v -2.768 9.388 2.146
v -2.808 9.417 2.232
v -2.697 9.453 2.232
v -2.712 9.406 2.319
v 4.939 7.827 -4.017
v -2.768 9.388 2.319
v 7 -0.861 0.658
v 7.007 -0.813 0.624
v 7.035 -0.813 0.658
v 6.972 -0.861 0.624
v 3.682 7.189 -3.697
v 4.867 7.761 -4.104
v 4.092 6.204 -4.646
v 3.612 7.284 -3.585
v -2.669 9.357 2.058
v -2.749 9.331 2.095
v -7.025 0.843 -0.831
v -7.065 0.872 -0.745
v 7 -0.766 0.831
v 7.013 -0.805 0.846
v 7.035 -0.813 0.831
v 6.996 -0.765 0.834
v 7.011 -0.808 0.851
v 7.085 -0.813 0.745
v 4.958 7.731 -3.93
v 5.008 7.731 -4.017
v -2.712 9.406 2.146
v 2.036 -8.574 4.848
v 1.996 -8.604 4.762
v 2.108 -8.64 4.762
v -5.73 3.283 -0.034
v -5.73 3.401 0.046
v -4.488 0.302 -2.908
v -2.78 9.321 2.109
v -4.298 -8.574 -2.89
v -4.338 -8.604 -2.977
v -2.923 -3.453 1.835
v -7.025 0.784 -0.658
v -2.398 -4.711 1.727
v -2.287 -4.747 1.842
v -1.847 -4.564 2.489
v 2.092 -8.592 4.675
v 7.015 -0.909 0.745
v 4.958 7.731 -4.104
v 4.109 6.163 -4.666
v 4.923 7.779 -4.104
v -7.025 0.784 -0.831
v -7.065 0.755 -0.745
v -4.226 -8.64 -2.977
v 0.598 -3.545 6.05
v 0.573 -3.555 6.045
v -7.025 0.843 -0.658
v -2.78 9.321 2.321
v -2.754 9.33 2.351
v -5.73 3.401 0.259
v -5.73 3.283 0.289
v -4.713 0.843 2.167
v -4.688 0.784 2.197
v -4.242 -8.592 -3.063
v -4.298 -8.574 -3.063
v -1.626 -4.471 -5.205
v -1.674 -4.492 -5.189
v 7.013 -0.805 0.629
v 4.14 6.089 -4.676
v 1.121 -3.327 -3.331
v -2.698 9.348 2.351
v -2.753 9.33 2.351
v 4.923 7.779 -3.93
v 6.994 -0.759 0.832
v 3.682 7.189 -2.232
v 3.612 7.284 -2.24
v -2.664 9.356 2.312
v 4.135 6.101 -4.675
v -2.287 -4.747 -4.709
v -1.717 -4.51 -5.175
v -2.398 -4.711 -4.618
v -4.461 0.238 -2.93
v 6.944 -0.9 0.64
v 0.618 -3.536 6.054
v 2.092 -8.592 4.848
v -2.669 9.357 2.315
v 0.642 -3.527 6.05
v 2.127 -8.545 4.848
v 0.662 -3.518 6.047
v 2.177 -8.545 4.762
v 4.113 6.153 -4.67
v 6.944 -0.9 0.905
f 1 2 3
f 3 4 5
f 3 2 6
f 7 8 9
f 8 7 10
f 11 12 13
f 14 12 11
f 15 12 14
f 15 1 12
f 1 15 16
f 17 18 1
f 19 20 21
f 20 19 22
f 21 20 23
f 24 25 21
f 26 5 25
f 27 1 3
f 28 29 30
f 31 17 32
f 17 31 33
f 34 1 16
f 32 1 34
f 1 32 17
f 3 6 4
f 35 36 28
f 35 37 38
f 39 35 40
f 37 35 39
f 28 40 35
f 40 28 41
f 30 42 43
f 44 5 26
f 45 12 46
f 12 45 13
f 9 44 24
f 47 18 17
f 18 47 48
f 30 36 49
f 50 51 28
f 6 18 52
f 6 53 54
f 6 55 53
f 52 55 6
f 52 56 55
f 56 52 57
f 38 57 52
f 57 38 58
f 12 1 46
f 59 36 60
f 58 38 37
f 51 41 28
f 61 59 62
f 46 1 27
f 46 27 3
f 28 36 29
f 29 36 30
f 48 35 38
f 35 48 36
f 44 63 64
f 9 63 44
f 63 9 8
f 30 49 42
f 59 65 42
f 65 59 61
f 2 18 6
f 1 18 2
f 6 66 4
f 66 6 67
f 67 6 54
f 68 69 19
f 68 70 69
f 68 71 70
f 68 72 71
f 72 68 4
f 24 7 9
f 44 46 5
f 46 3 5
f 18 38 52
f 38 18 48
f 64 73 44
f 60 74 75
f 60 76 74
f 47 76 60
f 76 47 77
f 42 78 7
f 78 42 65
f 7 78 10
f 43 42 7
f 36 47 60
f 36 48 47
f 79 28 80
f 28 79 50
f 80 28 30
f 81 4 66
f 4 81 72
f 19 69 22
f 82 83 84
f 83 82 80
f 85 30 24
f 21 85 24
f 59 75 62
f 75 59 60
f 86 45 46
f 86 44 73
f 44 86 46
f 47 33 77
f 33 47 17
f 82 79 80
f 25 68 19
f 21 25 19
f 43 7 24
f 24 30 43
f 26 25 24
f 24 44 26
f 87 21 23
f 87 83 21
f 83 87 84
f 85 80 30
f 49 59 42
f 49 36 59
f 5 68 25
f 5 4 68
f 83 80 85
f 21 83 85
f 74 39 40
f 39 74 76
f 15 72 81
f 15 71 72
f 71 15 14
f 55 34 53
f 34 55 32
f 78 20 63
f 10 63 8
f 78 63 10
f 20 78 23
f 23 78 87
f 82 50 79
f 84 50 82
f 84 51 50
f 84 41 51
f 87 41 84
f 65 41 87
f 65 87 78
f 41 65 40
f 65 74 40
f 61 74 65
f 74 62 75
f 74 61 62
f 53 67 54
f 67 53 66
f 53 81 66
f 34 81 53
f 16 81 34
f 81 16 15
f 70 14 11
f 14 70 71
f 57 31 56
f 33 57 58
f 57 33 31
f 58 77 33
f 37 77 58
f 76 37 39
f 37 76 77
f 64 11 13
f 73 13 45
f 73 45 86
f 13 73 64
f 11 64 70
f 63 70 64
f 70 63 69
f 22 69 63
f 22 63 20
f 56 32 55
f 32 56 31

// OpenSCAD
// Auto-generated OpenSCAD file

    inner_points = 10*[[0.06319597715687762, 0.1268463153899368, 1.0], [-0.2699443063437531, 0.9262320492567245, 0.5000000000006233], [0.691291687541074, -0.08050791918503769, -0.750000000000228], [-0.2317594497271782, -0.4651851838989617, -0.7500000000003951], [0.6912916875411965, -0.08050791918576636, 0.24999999999977196], [-0.23175944972705564, -0.4651851838996903, 0.24999999999960476], [0.3581514040405658, 0.7188778146810213, -0.24999999999960476], [-0.5648997332276864, 0.33420054996709736, -0.24999999999977196]];

    outer_points = 10*[[-0.4257137914058795, -0.8544883437355262, -0.29768681231614647], [0.20766159975206822, -0.8544883437355262, 0.47615788390882396], [0.490793922669076, 0.7731461234147987, -0.40170436557220773], [-0.27274173101526467, 0.9358305640562536, 0.22323329397953012], [0.06508013126319645, -0.08134222032072741, -0.6993911778883541], [-0.6984555224211442, 0.08134222032072741, -0.07445351833661629], [0.6984555224211442, -0.08134222032072741, 0.07445351833661629], [-0.06508013126319645, 0.08134222032072741, 0.6993911778883541]];

    // Convex hull for inner set (I)
    module inner_hull() {
        hull() {
            for (p = inner_points) {
                translate(p) sphere(r=0.1);
            }
        }
    }

    // Convex hull for outer set (O) minus inner hull (O \ I)
    module outer_minus_inner() {
        difference() {
            hull() {
                for (p = outer_points) {
                    translate(p) sphere(r=0.1);
                }
            }
            inner_hull(); // Subtract inner hull
        }
    }

    // Convex hull for outer set (O) minus all translated inner hulls
    module outer_minus_AllTranslationInner() {
        difference() {
            hull() {
                for (p = outer_points) {
                    translate(p) sphere(r=0.1);
                }
            }
            hull() {
                translate([0,0,50]) inner_hull();
                translate([0,0,-50]) inner_hull();
            }; // Subtract translated inner hulls
        }
    }

    // Difference between outer_minus_inner and outer_minus_AllTranslationInner
    module outer_minus_inner_diff() {
        difference() {
            // Outer minus inner
            difference() {
                hull() {
                    for (p = outer_points) {
                        translate(p) sphere(r=0.1);
                    }
                }
                inner_hull();
            }

            // Subtract Outer minus AllTranslationInner
            difference() {
                hull() {
                    for (p = outer_points) {
                        translate(p) sphere(r=0.1);
                    }
                }
                hull() {
                    translate([0,0,50]) inner_hull();
                    translate([0,0,-50]) inner_hull();
                };
            }
        }
    }

    // Rendering all with colors applied
    color([0, 1, 0, 1]) outer_minus_AllTranslationInner(); // Opaque green
    
